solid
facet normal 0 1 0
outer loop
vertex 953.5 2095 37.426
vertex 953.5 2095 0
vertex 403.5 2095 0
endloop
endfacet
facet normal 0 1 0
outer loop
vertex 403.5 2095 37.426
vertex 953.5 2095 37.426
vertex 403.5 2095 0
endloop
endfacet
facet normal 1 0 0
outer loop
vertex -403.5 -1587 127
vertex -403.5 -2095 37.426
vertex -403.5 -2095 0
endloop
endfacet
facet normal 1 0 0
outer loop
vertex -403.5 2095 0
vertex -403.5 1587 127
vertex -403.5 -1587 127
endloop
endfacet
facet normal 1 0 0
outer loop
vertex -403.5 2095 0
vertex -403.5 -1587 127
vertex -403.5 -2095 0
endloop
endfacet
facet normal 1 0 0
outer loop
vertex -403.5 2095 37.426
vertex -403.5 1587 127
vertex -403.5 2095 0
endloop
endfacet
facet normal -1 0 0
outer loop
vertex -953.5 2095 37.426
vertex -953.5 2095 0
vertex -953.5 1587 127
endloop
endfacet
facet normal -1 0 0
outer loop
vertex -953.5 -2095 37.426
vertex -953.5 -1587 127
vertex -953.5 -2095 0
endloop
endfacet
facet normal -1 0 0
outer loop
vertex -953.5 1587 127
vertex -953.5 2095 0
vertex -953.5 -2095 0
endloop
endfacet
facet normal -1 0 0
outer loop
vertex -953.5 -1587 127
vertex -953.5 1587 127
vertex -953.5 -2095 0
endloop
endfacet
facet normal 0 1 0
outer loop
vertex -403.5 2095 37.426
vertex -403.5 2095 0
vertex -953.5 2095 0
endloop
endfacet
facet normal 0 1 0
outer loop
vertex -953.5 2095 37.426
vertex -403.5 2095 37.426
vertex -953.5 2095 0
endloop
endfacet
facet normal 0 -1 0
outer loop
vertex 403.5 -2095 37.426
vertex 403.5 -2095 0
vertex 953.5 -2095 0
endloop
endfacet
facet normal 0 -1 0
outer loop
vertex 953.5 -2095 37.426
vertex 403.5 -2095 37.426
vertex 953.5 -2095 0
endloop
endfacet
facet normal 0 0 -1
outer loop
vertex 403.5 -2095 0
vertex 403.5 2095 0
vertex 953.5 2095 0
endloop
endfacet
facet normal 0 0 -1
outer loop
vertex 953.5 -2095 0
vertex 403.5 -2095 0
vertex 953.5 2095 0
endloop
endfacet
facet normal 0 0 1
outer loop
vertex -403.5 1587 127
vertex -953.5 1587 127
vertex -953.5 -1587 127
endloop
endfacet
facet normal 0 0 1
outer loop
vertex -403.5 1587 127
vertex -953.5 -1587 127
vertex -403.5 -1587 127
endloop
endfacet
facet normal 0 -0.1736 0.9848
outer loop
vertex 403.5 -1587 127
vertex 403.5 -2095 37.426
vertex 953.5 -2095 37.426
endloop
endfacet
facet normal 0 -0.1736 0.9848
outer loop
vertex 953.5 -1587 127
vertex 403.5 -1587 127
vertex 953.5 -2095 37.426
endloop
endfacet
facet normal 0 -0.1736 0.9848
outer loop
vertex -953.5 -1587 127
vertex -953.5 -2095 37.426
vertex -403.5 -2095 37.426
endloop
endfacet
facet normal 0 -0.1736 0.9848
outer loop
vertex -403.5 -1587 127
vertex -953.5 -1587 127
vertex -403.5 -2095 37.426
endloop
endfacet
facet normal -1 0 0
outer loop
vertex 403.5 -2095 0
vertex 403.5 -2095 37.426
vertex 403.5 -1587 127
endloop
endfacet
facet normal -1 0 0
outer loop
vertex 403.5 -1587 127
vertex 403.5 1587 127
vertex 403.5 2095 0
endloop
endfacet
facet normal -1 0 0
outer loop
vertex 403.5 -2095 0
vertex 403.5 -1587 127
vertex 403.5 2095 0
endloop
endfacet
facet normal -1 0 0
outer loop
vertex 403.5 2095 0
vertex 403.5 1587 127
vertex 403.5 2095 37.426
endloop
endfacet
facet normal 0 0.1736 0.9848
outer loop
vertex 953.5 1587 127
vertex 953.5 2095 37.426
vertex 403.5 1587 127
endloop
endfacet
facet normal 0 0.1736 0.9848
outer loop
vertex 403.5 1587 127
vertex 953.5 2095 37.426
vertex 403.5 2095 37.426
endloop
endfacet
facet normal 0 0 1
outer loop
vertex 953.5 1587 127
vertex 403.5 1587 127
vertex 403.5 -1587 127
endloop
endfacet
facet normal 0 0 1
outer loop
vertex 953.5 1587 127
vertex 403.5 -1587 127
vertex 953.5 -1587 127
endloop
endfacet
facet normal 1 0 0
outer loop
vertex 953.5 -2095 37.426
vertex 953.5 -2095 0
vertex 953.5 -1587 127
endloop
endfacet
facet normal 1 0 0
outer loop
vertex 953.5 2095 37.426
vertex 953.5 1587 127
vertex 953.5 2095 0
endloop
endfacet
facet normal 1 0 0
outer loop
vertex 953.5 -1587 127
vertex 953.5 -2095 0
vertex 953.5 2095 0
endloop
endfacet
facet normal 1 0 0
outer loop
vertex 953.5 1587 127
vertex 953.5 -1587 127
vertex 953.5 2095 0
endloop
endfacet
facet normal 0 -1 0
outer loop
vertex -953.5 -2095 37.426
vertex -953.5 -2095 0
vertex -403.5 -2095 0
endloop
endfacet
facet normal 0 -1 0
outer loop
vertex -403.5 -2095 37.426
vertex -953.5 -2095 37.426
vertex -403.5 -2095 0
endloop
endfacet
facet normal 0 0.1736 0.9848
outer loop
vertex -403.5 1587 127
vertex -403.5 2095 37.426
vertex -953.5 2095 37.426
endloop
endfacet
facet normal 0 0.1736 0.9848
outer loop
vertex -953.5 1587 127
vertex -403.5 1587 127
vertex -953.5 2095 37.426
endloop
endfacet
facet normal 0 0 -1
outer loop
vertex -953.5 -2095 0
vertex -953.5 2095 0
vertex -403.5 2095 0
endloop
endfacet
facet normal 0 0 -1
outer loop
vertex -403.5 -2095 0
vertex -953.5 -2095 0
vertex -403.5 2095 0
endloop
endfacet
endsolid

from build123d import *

# Parameters (mm, degrees)
F1_DEPTH   = 127
F2_W       = 807
F2_H       = 4190
F3_DEPTH   = 127.001
F4_SIZE2   = 89.5741061999
F4_SIZE    = 508
F4_2_SIZE2 = 89.5741061999
F4_2_SIZE  = 508


with BuildPart() as f1:
    # F0 (on Top) → F1 (new body)
    with BuildSketch(Plane.XY):
        Polygon((-953.5, 2095), (-953.5, -2095), (953.5, -2095), align=None)
        Polygon((-953.5, 2095), (953.5, -2095), (953.5, 2095), align=None)
    extrude(amount=F1_DEPTH)

    # F2 (on face) → F3 (cut, through all)
    with BuildSketch(Plane.XY.offset(127)):
        Rectangle(F2_W, F2_H)
    extrude(amount=-F3_DEPTH, mode=Mode.SUBTRACT)

    # F4
    f4_edges = [f1.edges().sort_by_distance(p)[0] for p in [
        (-678.5, -2095, 127),
        (-678.5, 2095, 127),
    ]]
    f4_side = f1.faces().sort_by_distance((-678.5, 0, 127))[0]
    chamfer(f4_edges, length=F4_SIZE, length2=F4_SIZE2, reference=f4_side)

    # F4#2
    f4_2_edges = [f1.edges().sort_by_distance(p)[0] for p in [
        (678.5, -2095, 127),
        (678.5, 2095, 127),
    ]]
    f4_2_side = f1.faces().sort_by_distance((678.5, 0, 127))[0]
    chamfer(f4_2_edges, length=F4_2_SIZE, length2=F4_2_SIZE2, reference=f4_2_side)


solid = f1.part
